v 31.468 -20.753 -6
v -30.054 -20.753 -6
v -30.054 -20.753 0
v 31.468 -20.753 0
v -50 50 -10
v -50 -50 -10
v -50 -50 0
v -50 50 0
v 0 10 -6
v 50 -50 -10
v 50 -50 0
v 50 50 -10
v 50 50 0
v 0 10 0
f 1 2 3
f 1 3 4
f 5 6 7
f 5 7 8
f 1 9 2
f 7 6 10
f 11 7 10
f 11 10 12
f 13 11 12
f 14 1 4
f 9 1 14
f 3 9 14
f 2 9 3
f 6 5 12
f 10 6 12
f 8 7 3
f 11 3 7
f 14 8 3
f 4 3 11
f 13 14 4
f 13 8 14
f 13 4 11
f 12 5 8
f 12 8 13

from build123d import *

# Parameters (mm, degrees)
PAD_DEPTH    = 12
SKETCH001_W  = 100
SKETCH001_H  = 100
PAD001_DEPTH = 10


with BuildPart() as body:
    # Sketch → Pad (new body)
    with BuildSketch(Plane.XY):
        Polygon((-30.054117, -20.75305), (31.468237, -20.75305), (0, 10), align=None)
    extrude(amount=PAD_DEPTH)


with BuildPart() as body_1:
    # Body placement: moved
    add(body.part.moved(Location((0, 0, -6))))


with BuildPart() as model_cut:
    # Sketch001 → Pad001 (new body)
    with BuildSketch(Plane.XY):
        Rectangle(SKETCH001_W, SKETCH001_H)
    extrude(amount=PAD001_DEPTH)


with BuildPart() as model_cut_1:
    # Body001 placement: moved
    add(model_cut.part.moved(Location((0, 0, -10))))

    # Cut: cut Body
    add(body_1.part, mode=Mode.SUBTRACT)


solid = model_cut_1.part
